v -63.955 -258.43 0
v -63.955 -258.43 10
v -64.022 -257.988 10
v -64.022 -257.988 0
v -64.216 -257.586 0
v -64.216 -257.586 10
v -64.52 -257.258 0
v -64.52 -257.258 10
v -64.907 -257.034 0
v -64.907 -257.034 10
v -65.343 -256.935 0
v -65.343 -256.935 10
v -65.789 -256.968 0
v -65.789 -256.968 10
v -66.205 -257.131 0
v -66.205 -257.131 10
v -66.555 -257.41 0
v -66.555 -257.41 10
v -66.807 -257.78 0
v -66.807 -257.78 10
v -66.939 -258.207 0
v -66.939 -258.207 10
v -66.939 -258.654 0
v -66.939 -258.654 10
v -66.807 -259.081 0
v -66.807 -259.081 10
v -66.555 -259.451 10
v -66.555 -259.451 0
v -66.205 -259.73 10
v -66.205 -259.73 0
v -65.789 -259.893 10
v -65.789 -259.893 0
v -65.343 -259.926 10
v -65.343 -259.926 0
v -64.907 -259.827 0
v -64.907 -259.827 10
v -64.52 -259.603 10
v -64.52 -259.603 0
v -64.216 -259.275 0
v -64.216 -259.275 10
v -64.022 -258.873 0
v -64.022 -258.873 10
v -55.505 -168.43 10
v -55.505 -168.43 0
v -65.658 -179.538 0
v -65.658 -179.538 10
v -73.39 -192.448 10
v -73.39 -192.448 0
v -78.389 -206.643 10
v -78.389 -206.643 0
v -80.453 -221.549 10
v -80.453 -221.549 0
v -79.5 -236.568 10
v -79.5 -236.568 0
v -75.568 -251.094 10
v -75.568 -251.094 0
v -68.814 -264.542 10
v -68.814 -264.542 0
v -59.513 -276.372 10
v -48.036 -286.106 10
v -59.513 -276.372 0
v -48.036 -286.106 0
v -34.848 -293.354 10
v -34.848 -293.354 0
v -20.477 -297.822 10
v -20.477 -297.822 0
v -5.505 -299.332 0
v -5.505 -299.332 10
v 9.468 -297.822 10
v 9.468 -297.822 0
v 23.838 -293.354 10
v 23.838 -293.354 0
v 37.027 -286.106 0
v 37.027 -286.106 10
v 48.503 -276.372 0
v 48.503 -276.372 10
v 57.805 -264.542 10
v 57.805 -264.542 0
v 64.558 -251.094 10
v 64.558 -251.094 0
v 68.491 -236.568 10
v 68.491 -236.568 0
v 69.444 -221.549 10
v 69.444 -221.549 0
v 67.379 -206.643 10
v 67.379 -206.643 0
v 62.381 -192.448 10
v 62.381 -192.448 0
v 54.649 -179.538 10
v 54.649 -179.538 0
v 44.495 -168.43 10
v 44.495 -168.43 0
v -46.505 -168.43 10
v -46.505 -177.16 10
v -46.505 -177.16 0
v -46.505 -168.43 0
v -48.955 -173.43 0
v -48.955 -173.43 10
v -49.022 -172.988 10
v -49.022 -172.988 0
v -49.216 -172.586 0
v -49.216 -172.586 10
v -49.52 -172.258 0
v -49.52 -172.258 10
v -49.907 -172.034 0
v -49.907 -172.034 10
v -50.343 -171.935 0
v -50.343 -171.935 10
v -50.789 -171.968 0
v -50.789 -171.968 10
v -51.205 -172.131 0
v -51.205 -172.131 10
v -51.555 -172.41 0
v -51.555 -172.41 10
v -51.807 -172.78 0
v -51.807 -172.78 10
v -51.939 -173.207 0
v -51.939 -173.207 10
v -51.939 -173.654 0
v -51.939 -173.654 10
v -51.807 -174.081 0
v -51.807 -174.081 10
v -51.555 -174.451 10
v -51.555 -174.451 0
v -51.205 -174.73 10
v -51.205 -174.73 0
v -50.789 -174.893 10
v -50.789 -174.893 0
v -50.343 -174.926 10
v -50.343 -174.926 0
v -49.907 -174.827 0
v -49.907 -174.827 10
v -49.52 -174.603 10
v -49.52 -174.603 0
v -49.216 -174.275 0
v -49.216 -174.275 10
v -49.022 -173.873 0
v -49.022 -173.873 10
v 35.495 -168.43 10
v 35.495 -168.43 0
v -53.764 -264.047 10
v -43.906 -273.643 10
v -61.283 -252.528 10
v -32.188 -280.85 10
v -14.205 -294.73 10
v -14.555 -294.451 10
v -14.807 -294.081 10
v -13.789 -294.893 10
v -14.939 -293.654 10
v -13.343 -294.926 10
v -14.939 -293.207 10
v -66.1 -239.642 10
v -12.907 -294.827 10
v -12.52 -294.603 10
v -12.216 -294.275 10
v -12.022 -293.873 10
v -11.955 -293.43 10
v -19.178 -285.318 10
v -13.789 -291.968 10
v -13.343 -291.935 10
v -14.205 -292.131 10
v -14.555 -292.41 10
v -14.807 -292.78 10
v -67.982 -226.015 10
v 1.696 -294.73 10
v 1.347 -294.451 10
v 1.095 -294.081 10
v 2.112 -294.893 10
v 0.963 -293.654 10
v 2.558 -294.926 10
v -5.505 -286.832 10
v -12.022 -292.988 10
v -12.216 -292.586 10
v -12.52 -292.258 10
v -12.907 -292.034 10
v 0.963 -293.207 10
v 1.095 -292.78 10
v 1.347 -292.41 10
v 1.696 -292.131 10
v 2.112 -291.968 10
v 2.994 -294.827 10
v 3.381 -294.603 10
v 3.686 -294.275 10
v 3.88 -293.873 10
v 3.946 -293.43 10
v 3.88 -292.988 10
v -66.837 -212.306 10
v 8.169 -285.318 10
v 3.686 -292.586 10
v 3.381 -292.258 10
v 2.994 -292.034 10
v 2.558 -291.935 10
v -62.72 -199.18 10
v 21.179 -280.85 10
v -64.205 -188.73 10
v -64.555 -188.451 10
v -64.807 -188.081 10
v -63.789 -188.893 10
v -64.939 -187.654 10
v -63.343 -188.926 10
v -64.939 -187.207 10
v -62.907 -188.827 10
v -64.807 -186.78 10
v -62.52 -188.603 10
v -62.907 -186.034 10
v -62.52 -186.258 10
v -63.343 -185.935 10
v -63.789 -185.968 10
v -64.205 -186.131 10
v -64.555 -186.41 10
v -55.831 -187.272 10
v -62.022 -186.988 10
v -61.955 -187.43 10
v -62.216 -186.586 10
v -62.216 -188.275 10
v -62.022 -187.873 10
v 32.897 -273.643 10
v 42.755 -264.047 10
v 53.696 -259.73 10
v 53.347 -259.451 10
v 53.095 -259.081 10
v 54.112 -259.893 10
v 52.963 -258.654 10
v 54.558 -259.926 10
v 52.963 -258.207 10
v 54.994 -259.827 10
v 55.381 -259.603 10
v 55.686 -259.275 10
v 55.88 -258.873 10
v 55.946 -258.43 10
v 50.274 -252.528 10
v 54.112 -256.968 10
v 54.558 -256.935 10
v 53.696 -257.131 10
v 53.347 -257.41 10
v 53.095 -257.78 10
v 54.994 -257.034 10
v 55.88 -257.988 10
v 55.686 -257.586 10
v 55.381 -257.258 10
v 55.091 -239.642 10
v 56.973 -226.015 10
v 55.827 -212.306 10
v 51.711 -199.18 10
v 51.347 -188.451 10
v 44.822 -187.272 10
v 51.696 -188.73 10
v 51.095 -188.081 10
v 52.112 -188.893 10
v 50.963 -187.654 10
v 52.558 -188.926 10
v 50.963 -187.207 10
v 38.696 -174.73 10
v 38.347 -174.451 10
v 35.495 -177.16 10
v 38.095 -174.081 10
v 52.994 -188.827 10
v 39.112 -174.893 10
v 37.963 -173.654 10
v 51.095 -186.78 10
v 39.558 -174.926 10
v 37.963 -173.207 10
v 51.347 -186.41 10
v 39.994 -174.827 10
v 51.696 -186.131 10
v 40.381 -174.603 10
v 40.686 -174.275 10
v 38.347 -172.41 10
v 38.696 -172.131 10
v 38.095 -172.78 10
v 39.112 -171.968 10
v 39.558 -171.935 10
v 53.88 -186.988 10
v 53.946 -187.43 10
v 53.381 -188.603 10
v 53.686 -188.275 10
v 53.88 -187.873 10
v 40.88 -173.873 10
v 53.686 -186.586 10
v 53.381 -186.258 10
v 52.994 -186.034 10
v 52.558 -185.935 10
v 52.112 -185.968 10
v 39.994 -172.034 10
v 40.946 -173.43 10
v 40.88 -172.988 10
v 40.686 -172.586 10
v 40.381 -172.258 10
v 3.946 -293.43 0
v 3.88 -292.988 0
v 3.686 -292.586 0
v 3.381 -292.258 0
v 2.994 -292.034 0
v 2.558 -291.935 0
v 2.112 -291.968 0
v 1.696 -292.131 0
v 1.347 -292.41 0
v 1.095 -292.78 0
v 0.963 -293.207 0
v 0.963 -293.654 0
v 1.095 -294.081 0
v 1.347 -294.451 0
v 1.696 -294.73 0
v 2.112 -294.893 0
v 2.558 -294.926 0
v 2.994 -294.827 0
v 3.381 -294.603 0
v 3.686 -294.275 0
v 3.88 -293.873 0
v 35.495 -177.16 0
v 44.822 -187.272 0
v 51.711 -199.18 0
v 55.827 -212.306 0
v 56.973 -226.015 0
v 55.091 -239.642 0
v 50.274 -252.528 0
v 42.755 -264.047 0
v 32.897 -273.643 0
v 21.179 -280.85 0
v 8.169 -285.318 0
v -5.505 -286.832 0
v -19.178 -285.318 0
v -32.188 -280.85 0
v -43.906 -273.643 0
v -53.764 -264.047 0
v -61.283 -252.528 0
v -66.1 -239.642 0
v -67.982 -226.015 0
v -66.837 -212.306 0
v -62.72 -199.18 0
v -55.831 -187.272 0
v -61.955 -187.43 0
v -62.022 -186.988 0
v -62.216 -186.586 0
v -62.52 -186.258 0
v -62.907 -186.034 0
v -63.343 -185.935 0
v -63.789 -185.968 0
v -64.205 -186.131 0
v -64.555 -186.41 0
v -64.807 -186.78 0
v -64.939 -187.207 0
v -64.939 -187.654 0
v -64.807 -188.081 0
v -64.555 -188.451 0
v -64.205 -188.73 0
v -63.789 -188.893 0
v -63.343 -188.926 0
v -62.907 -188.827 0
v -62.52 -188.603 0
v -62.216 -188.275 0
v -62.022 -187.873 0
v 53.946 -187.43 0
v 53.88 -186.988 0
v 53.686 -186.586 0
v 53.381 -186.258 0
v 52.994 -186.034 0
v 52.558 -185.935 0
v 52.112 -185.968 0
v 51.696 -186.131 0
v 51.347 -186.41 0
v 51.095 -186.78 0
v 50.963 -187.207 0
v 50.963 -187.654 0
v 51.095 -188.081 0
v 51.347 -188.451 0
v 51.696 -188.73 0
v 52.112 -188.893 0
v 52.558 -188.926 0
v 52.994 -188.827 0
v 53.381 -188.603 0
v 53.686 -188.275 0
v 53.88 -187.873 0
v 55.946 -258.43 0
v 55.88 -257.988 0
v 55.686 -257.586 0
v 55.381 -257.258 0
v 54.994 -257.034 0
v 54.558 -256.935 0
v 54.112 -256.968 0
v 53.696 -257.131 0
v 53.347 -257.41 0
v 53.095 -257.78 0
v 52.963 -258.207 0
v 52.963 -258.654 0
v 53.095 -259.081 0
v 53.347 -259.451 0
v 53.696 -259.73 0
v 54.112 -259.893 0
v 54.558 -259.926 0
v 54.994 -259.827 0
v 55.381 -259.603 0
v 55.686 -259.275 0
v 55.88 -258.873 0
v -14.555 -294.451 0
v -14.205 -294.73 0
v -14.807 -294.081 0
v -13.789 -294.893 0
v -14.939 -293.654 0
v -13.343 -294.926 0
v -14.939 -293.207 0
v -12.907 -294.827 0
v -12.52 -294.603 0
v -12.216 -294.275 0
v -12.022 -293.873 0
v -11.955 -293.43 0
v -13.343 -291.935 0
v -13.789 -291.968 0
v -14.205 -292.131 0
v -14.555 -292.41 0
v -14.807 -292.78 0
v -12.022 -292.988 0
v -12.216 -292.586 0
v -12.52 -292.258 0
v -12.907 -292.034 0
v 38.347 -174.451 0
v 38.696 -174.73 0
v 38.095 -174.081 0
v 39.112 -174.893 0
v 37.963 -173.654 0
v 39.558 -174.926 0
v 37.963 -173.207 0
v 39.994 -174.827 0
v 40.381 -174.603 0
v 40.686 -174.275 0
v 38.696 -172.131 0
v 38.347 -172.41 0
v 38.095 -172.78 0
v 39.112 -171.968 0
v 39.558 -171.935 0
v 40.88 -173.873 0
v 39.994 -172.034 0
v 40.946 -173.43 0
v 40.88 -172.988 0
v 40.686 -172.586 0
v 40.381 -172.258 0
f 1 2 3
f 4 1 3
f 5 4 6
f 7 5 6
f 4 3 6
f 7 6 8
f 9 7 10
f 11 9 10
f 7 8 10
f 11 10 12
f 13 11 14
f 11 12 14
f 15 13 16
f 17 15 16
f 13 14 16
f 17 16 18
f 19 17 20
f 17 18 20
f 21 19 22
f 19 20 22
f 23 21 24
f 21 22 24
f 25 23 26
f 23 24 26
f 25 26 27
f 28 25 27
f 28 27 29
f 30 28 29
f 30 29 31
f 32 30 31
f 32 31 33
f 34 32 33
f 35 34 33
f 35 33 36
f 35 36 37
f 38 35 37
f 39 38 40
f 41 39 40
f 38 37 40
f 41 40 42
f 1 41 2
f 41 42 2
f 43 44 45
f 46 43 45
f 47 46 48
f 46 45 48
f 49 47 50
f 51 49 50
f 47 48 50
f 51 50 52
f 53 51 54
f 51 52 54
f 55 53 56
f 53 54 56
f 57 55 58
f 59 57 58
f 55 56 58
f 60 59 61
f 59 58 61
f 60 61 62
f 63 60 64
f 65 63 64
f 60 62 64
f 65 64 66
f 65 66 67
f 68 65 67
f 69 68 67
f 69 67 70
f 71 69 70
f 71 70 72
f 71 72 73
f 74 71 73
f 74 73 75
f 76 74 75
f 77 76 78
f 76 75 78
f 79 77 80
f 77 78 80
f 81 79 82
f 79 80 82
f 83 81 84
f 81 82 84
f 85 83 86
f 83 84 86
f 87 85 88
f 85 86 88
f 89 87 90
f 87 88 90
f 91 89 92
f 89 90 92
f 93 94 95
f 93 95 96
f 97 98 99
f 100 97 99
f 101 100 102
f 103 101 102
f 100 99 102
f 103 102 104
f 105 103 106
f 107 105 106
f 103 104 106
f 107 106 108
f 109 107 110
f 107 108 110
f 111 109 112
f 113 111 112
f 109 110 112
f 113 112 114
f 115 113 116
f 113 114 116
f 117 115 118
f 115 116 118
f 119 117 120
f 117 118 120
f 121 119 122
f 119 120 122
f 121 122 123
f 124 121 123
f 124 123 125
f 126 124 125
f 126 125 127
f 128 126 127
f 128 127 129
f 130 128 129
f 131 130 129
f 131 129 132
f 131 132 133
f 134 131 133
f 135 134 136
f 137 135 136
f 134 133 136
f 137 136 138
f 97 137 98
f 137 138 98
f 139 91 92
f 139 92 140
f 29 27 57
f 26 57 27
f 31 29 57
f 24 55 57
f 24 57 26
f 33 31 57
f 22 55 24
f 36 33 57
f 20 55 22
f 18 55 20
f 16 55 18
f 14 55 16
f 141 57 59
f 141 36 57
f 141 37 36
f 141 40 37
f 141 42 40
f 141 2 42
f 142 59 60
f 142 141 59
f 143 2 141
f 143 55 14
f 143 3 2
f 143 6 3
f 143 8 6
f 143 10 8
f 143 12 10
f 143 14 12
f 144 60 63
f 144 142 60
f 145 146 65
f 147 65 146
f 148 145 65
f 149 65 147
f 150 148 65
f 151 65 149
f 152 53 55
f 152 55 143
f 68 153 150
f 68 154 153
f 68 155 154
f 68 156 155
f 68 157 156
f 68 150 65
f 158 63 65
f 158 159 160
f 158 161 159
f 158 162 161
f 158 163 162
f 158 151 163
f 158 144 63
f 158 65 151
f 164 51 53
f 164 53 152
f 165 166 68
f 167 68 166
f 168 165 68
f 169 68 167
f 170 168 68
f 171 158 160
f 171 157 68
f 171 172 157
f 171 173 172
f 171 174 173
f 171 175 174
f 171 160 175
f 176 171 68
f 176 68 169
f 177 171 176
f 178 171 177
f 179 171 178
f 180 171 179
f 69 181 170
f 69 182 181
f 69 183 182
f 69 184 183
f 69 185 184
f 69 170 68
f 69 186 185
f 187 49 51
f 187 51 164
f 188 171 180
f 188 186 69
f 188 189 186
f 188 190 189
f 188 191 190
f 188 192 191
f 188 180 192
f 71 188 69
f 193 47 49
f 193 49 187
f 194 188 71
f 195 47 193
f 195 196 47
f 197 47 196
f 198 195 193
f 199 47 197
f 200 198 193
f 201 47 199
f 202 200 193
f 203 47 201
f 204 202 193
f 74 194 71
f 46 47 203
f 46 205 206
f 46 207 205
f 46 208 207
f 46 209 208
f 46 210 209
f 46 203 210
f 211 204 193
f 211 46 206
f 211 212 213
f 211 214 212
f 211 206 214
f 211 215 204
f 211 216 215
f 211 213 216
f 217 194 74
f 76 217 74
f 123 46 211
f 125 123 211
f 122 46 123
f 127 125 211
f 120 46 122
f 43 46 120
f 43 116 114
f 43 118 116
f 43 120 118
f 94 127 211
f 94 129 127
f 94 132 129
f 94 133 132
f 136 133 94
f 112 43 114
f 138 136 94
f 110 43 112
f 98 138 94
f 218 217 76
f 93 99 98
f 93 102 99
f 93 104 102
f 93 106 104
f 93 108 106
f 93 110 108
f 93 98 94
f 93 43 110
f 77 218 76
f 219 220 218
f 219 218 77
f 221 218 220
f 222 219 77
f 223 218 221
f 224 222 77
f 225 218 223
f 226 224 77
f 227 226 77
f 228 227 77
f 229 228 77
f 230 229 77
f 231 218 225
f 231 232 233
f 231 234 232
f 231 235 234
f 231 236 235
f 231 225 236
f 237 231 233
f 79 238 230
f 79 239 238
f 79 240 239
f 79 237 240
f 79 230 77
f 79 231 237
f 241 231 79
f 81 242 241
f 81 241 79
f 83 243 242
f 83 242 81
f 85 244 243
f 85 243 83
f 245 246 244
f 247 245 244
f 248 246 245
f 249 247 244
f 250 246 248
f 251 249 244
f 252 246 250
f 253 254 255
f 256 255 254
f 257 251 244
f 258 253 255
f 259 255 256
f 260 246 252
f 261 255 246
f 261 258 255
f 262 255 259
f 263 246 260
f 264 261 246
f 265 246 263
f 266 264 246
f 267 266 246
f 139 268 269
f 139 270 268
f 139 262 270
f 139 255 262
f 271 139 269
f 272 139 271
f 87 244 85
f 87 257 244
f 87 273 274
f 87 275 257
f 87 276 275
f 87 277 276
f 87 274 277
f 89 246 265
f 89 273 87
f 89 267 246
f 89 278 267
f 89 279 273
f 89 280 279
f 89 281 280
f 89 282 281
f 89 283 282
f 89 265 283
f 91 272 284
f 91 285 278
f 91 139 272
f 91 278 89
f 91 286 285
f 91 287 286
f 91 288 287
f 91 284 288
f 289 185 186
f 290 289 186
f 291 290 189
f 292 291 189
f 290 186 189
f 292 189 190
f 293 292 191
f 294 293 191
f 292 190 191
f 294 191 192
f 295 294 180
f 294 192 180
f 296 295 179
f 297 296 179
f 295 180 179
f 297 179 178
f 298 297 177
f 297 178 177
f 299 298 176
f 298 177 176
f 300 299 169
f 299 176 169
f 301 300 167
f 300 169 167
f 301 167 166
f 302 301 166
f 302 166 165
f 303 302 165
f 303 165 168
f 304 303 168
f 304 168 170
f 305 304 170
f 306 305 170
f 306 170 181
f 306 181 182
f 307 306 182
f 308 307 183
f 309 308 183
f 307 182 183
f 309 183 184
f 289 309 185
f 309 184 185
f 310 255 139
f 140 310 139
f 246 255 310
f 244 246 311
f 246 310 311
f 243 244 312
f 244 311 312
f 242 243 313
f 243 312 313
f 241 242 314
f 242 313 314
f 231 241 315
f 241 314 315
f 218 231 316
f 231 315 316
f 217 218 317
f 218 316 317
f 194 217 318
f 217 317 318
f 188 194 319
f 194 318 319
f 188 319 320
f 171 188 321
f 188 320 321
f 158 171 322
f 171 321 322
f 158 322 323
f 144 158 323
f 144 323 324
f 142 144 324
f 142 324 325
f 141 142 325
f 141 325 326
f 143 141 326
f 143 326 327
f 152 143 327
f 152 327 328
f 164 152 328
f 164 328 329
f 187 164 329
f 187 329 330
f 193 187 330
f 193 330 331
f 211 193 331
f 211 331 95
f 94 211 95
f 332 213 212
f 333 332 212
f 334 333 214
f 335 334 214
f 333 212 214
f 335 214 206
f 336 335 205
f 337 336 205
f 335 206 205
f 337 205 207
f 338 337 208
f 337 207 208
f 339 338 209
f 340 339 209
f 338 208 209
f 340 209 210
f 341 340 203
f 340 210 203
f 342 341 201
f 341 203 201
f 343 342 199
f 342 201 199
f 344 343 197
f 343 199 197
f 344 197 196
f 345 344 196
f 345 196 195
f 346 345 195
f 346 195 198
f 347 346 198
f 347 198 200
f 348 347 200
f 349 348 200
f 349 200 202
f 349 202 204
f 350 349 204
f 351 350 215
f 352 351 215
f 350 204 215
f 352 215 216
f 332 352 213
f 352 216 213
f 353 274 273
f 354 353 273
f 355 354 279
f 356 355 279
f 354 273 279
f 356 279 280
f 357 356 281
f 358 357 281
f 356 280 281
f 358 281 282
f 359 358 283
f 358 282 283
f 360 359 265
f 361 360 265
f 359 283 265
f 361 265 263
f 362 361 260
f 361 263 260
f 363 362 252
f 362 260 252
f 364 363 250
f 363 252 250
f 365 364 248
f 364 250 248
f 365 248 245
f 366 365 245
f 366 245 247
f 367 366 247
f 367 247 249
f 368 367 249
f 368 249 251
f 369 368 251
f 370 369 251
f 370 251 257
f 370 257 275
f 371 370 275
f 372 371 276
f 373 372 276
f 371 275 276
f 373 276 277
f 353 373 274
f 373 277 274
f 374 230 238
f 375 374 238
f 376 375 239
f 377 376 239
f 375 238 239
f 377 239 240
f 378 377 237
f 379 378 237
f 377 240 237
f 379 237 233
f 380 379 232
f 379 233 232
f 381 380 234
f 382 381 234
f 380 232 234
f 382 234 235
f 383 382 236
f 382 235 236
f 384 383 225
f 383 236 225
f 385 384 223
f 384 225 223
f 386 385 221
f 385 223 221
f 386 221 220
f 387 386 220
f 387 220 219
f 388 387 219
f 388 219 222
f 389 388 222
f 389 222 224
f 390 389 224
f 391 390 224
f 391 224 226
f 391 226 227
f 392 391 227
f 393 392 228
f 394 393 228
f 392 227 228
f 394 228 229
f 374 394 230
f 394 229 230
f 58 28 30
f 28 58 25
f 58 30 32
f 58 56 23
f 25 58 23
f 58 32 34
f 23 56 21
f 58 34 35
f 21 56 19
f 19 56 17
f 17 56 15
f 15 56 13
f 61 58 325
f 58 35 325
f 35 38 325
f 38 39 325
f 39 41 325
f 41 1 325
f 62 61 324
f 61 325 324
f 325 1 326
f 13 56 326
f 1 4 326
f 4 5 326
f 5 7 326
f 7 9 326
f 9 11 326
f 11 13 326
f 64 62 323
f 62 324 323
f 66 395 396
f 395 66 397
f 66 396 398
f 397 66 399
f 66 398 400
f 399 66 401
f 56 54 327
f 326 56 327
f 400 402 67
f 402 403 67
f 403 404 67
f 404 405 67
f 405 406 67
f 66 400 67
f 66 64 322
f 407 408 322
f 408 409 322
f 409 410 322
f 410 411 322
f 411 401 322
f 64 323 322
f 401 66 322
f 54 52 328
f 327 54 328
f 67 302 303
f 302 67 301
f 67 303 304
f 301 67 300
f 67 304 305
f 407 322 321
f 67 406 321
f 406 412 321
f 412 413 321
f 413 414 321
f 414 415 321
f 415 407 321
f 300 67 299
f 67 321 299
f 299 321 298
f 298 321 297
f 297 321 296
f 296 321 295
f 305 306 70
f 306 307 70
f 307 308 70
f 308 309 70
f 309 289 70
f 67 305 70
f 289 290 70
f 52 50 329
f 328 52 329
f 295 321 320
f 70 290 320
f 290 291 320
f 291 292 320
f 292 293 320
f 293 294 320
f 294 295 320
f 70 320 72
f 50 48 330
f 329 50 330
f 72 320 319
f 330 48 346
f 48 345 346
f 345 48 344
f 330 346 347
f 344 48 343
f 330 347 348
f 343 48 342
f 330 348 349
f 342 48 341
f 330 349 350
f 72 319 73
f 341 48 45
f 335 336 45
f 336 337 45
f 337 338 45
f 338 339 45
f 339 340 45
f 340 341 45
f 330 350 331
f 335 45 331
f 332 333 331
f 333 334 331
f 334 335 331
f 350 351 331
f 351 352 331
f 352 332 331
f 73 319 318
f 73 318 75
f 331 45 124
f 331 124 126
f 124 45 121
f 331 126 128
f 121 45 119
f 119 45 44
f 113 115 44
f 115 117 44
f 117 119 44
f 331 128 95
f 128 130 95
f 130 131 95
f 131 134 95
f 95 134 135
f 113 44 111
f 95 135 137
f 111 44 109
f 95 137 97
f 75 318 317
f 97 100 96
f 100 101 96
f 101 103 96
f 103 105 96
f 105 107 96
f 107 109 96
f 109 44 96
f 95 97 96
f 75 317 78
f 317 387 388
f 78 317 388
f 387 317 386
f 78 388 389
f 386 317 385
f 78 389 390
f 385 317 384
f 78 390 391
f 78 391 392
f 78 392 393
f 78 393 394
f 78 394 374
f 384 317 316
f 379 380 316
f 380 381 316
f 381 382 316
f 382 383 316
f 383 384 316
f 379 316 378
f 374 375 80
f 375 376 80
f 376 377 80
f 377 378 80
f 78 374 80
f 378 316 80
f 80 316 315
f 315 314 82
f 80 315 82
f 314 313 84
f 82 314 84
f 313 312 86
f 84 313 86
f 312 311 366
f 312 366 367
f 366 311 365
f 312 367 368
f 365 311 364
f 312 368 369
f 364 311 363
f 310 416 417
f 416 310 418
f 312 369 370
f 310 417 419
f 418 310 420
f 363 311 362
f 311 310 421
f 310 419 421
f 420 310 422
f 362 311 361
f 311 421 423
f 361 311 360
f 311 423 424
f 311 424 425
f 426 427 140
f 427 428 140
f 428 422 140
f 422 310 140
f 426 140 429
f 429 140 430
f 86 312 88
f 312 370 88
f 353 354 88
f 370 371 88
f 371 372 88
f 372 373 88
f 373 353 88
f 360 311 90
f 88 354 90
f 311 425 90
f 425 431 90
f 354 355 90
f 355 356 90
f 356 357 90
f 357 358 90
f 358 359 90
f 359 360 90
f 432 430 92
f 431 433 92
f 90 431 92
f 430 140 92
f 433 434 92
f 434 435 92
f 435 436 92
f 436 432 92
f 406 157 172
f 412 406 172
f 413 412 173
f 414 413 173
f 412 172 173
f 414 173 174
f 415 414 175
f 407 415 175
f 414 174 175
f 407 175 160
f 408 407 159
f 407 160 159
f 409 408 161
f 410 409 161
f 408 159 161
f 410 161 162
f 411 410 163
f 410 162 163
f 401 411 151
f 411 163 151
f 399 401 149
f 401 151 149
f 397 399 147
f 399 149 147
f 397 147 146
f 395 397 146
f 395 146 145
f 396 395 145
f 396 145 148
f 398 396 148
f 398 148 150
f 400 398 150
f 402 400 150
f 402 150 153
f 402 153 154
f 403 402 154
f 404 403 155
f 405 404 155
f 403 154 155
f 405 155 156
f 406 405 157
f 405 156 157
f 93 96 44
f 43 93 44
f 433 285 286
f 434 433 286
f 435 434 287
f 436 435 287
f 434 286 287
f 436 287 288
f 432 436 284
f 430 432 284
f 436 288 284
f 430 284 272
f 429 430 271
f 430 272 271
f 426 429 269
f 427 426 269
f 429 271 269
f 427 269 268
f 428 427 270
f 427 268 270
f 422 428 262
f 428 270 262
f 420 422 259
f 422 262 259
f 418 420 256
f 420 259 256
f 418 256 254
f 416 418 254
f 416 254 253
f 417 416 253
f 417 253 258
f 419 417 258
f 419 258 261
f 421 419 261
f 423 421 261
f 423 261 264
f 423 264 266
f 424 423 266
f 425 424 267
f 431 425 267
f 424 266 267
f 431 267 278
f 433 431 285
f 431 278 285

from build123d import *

# Parameters (mm, degrees)
RESSALTO_EXTRUS_O1_DEPTH = 10
ESBO_O2_R                = 1.5
CORTE_EXTRUS_O1_DEPTH    = 10
ESBO_O3_W                = 82
ESBO_O3_H                = 21.575786581
CORTE_EXTRUS_O2_DEPTH    = 11


with BuildPart() as part:
    # Esboço1 → Ressalto-extrusão1 (new body)
    with BuildSketch(Plane.XY):
        with BuildLine():
            Line((44.495405461, -168.430491325), (22.44625518, -168.430491325))
            ThreePointArc((22.44625518, -168.430491325), (-5.504594539, -286.832190763), (-33.455444258, -168.430491325))
            Line((-33.455444258, -168.430491325), (-55.504594539, -168.430491325))
            ThreePointArc((-55.504594539, -168.430491325), (-5.504594539, -299.332190763), (44.495405461, -168.430491325))
        make_face()
    extrude(amount=RESSALTO_EXTRUS_O1_DEPTH)

    # Esboço2 → Corte-extrusão1 (cut)
    with BuildSketch(Plane.XY.offset(10)):
        with Locations((39.44625518, -173.430491325)):
            Circle(ESBO_O2_R)
        with Locations((52.44625518, -187.430491325)):
            Circle(ESBO_O2_R)
        with Locations((54.44625518, -258.430491325)):
            Circle(ESBO_O2_R)
        with Locations((-13.455444258, -293.430491325)):
            Circle(ESBO_O2_R)
        with Locations((2.44625518, -293.430491325)):
            Circle(ESBO_O2_R)
        with Locations((-65.455444258, -258.430491325)):
            Circle(ESBO_O2_R)
        with Locations((-63.455444258, -187.430491325)):
            Circle(ESBO_O2_R)
        with Locations((-50.455444258, -173.430491325)):
            Circle(ESBO_O2_R)
    extrude(amount=-CORTE_EXTRUS_O1_DEPTH, mode=Mode.SUBTRACT)

    # Esboço3 → Corte-extrusão2 (cut, through all)
    with BuildSketch(Plane.XY.offset(10)):
        with Locations((-5.504594539, -170.044523075)):
            Rectangle(ESBO_O3_W, ESBO_O3_H)
    extrude(amount=-CORTE_EXTRUS_O2_DEPTH, mode=Mode.SUBTRACT)


solid = part.part
